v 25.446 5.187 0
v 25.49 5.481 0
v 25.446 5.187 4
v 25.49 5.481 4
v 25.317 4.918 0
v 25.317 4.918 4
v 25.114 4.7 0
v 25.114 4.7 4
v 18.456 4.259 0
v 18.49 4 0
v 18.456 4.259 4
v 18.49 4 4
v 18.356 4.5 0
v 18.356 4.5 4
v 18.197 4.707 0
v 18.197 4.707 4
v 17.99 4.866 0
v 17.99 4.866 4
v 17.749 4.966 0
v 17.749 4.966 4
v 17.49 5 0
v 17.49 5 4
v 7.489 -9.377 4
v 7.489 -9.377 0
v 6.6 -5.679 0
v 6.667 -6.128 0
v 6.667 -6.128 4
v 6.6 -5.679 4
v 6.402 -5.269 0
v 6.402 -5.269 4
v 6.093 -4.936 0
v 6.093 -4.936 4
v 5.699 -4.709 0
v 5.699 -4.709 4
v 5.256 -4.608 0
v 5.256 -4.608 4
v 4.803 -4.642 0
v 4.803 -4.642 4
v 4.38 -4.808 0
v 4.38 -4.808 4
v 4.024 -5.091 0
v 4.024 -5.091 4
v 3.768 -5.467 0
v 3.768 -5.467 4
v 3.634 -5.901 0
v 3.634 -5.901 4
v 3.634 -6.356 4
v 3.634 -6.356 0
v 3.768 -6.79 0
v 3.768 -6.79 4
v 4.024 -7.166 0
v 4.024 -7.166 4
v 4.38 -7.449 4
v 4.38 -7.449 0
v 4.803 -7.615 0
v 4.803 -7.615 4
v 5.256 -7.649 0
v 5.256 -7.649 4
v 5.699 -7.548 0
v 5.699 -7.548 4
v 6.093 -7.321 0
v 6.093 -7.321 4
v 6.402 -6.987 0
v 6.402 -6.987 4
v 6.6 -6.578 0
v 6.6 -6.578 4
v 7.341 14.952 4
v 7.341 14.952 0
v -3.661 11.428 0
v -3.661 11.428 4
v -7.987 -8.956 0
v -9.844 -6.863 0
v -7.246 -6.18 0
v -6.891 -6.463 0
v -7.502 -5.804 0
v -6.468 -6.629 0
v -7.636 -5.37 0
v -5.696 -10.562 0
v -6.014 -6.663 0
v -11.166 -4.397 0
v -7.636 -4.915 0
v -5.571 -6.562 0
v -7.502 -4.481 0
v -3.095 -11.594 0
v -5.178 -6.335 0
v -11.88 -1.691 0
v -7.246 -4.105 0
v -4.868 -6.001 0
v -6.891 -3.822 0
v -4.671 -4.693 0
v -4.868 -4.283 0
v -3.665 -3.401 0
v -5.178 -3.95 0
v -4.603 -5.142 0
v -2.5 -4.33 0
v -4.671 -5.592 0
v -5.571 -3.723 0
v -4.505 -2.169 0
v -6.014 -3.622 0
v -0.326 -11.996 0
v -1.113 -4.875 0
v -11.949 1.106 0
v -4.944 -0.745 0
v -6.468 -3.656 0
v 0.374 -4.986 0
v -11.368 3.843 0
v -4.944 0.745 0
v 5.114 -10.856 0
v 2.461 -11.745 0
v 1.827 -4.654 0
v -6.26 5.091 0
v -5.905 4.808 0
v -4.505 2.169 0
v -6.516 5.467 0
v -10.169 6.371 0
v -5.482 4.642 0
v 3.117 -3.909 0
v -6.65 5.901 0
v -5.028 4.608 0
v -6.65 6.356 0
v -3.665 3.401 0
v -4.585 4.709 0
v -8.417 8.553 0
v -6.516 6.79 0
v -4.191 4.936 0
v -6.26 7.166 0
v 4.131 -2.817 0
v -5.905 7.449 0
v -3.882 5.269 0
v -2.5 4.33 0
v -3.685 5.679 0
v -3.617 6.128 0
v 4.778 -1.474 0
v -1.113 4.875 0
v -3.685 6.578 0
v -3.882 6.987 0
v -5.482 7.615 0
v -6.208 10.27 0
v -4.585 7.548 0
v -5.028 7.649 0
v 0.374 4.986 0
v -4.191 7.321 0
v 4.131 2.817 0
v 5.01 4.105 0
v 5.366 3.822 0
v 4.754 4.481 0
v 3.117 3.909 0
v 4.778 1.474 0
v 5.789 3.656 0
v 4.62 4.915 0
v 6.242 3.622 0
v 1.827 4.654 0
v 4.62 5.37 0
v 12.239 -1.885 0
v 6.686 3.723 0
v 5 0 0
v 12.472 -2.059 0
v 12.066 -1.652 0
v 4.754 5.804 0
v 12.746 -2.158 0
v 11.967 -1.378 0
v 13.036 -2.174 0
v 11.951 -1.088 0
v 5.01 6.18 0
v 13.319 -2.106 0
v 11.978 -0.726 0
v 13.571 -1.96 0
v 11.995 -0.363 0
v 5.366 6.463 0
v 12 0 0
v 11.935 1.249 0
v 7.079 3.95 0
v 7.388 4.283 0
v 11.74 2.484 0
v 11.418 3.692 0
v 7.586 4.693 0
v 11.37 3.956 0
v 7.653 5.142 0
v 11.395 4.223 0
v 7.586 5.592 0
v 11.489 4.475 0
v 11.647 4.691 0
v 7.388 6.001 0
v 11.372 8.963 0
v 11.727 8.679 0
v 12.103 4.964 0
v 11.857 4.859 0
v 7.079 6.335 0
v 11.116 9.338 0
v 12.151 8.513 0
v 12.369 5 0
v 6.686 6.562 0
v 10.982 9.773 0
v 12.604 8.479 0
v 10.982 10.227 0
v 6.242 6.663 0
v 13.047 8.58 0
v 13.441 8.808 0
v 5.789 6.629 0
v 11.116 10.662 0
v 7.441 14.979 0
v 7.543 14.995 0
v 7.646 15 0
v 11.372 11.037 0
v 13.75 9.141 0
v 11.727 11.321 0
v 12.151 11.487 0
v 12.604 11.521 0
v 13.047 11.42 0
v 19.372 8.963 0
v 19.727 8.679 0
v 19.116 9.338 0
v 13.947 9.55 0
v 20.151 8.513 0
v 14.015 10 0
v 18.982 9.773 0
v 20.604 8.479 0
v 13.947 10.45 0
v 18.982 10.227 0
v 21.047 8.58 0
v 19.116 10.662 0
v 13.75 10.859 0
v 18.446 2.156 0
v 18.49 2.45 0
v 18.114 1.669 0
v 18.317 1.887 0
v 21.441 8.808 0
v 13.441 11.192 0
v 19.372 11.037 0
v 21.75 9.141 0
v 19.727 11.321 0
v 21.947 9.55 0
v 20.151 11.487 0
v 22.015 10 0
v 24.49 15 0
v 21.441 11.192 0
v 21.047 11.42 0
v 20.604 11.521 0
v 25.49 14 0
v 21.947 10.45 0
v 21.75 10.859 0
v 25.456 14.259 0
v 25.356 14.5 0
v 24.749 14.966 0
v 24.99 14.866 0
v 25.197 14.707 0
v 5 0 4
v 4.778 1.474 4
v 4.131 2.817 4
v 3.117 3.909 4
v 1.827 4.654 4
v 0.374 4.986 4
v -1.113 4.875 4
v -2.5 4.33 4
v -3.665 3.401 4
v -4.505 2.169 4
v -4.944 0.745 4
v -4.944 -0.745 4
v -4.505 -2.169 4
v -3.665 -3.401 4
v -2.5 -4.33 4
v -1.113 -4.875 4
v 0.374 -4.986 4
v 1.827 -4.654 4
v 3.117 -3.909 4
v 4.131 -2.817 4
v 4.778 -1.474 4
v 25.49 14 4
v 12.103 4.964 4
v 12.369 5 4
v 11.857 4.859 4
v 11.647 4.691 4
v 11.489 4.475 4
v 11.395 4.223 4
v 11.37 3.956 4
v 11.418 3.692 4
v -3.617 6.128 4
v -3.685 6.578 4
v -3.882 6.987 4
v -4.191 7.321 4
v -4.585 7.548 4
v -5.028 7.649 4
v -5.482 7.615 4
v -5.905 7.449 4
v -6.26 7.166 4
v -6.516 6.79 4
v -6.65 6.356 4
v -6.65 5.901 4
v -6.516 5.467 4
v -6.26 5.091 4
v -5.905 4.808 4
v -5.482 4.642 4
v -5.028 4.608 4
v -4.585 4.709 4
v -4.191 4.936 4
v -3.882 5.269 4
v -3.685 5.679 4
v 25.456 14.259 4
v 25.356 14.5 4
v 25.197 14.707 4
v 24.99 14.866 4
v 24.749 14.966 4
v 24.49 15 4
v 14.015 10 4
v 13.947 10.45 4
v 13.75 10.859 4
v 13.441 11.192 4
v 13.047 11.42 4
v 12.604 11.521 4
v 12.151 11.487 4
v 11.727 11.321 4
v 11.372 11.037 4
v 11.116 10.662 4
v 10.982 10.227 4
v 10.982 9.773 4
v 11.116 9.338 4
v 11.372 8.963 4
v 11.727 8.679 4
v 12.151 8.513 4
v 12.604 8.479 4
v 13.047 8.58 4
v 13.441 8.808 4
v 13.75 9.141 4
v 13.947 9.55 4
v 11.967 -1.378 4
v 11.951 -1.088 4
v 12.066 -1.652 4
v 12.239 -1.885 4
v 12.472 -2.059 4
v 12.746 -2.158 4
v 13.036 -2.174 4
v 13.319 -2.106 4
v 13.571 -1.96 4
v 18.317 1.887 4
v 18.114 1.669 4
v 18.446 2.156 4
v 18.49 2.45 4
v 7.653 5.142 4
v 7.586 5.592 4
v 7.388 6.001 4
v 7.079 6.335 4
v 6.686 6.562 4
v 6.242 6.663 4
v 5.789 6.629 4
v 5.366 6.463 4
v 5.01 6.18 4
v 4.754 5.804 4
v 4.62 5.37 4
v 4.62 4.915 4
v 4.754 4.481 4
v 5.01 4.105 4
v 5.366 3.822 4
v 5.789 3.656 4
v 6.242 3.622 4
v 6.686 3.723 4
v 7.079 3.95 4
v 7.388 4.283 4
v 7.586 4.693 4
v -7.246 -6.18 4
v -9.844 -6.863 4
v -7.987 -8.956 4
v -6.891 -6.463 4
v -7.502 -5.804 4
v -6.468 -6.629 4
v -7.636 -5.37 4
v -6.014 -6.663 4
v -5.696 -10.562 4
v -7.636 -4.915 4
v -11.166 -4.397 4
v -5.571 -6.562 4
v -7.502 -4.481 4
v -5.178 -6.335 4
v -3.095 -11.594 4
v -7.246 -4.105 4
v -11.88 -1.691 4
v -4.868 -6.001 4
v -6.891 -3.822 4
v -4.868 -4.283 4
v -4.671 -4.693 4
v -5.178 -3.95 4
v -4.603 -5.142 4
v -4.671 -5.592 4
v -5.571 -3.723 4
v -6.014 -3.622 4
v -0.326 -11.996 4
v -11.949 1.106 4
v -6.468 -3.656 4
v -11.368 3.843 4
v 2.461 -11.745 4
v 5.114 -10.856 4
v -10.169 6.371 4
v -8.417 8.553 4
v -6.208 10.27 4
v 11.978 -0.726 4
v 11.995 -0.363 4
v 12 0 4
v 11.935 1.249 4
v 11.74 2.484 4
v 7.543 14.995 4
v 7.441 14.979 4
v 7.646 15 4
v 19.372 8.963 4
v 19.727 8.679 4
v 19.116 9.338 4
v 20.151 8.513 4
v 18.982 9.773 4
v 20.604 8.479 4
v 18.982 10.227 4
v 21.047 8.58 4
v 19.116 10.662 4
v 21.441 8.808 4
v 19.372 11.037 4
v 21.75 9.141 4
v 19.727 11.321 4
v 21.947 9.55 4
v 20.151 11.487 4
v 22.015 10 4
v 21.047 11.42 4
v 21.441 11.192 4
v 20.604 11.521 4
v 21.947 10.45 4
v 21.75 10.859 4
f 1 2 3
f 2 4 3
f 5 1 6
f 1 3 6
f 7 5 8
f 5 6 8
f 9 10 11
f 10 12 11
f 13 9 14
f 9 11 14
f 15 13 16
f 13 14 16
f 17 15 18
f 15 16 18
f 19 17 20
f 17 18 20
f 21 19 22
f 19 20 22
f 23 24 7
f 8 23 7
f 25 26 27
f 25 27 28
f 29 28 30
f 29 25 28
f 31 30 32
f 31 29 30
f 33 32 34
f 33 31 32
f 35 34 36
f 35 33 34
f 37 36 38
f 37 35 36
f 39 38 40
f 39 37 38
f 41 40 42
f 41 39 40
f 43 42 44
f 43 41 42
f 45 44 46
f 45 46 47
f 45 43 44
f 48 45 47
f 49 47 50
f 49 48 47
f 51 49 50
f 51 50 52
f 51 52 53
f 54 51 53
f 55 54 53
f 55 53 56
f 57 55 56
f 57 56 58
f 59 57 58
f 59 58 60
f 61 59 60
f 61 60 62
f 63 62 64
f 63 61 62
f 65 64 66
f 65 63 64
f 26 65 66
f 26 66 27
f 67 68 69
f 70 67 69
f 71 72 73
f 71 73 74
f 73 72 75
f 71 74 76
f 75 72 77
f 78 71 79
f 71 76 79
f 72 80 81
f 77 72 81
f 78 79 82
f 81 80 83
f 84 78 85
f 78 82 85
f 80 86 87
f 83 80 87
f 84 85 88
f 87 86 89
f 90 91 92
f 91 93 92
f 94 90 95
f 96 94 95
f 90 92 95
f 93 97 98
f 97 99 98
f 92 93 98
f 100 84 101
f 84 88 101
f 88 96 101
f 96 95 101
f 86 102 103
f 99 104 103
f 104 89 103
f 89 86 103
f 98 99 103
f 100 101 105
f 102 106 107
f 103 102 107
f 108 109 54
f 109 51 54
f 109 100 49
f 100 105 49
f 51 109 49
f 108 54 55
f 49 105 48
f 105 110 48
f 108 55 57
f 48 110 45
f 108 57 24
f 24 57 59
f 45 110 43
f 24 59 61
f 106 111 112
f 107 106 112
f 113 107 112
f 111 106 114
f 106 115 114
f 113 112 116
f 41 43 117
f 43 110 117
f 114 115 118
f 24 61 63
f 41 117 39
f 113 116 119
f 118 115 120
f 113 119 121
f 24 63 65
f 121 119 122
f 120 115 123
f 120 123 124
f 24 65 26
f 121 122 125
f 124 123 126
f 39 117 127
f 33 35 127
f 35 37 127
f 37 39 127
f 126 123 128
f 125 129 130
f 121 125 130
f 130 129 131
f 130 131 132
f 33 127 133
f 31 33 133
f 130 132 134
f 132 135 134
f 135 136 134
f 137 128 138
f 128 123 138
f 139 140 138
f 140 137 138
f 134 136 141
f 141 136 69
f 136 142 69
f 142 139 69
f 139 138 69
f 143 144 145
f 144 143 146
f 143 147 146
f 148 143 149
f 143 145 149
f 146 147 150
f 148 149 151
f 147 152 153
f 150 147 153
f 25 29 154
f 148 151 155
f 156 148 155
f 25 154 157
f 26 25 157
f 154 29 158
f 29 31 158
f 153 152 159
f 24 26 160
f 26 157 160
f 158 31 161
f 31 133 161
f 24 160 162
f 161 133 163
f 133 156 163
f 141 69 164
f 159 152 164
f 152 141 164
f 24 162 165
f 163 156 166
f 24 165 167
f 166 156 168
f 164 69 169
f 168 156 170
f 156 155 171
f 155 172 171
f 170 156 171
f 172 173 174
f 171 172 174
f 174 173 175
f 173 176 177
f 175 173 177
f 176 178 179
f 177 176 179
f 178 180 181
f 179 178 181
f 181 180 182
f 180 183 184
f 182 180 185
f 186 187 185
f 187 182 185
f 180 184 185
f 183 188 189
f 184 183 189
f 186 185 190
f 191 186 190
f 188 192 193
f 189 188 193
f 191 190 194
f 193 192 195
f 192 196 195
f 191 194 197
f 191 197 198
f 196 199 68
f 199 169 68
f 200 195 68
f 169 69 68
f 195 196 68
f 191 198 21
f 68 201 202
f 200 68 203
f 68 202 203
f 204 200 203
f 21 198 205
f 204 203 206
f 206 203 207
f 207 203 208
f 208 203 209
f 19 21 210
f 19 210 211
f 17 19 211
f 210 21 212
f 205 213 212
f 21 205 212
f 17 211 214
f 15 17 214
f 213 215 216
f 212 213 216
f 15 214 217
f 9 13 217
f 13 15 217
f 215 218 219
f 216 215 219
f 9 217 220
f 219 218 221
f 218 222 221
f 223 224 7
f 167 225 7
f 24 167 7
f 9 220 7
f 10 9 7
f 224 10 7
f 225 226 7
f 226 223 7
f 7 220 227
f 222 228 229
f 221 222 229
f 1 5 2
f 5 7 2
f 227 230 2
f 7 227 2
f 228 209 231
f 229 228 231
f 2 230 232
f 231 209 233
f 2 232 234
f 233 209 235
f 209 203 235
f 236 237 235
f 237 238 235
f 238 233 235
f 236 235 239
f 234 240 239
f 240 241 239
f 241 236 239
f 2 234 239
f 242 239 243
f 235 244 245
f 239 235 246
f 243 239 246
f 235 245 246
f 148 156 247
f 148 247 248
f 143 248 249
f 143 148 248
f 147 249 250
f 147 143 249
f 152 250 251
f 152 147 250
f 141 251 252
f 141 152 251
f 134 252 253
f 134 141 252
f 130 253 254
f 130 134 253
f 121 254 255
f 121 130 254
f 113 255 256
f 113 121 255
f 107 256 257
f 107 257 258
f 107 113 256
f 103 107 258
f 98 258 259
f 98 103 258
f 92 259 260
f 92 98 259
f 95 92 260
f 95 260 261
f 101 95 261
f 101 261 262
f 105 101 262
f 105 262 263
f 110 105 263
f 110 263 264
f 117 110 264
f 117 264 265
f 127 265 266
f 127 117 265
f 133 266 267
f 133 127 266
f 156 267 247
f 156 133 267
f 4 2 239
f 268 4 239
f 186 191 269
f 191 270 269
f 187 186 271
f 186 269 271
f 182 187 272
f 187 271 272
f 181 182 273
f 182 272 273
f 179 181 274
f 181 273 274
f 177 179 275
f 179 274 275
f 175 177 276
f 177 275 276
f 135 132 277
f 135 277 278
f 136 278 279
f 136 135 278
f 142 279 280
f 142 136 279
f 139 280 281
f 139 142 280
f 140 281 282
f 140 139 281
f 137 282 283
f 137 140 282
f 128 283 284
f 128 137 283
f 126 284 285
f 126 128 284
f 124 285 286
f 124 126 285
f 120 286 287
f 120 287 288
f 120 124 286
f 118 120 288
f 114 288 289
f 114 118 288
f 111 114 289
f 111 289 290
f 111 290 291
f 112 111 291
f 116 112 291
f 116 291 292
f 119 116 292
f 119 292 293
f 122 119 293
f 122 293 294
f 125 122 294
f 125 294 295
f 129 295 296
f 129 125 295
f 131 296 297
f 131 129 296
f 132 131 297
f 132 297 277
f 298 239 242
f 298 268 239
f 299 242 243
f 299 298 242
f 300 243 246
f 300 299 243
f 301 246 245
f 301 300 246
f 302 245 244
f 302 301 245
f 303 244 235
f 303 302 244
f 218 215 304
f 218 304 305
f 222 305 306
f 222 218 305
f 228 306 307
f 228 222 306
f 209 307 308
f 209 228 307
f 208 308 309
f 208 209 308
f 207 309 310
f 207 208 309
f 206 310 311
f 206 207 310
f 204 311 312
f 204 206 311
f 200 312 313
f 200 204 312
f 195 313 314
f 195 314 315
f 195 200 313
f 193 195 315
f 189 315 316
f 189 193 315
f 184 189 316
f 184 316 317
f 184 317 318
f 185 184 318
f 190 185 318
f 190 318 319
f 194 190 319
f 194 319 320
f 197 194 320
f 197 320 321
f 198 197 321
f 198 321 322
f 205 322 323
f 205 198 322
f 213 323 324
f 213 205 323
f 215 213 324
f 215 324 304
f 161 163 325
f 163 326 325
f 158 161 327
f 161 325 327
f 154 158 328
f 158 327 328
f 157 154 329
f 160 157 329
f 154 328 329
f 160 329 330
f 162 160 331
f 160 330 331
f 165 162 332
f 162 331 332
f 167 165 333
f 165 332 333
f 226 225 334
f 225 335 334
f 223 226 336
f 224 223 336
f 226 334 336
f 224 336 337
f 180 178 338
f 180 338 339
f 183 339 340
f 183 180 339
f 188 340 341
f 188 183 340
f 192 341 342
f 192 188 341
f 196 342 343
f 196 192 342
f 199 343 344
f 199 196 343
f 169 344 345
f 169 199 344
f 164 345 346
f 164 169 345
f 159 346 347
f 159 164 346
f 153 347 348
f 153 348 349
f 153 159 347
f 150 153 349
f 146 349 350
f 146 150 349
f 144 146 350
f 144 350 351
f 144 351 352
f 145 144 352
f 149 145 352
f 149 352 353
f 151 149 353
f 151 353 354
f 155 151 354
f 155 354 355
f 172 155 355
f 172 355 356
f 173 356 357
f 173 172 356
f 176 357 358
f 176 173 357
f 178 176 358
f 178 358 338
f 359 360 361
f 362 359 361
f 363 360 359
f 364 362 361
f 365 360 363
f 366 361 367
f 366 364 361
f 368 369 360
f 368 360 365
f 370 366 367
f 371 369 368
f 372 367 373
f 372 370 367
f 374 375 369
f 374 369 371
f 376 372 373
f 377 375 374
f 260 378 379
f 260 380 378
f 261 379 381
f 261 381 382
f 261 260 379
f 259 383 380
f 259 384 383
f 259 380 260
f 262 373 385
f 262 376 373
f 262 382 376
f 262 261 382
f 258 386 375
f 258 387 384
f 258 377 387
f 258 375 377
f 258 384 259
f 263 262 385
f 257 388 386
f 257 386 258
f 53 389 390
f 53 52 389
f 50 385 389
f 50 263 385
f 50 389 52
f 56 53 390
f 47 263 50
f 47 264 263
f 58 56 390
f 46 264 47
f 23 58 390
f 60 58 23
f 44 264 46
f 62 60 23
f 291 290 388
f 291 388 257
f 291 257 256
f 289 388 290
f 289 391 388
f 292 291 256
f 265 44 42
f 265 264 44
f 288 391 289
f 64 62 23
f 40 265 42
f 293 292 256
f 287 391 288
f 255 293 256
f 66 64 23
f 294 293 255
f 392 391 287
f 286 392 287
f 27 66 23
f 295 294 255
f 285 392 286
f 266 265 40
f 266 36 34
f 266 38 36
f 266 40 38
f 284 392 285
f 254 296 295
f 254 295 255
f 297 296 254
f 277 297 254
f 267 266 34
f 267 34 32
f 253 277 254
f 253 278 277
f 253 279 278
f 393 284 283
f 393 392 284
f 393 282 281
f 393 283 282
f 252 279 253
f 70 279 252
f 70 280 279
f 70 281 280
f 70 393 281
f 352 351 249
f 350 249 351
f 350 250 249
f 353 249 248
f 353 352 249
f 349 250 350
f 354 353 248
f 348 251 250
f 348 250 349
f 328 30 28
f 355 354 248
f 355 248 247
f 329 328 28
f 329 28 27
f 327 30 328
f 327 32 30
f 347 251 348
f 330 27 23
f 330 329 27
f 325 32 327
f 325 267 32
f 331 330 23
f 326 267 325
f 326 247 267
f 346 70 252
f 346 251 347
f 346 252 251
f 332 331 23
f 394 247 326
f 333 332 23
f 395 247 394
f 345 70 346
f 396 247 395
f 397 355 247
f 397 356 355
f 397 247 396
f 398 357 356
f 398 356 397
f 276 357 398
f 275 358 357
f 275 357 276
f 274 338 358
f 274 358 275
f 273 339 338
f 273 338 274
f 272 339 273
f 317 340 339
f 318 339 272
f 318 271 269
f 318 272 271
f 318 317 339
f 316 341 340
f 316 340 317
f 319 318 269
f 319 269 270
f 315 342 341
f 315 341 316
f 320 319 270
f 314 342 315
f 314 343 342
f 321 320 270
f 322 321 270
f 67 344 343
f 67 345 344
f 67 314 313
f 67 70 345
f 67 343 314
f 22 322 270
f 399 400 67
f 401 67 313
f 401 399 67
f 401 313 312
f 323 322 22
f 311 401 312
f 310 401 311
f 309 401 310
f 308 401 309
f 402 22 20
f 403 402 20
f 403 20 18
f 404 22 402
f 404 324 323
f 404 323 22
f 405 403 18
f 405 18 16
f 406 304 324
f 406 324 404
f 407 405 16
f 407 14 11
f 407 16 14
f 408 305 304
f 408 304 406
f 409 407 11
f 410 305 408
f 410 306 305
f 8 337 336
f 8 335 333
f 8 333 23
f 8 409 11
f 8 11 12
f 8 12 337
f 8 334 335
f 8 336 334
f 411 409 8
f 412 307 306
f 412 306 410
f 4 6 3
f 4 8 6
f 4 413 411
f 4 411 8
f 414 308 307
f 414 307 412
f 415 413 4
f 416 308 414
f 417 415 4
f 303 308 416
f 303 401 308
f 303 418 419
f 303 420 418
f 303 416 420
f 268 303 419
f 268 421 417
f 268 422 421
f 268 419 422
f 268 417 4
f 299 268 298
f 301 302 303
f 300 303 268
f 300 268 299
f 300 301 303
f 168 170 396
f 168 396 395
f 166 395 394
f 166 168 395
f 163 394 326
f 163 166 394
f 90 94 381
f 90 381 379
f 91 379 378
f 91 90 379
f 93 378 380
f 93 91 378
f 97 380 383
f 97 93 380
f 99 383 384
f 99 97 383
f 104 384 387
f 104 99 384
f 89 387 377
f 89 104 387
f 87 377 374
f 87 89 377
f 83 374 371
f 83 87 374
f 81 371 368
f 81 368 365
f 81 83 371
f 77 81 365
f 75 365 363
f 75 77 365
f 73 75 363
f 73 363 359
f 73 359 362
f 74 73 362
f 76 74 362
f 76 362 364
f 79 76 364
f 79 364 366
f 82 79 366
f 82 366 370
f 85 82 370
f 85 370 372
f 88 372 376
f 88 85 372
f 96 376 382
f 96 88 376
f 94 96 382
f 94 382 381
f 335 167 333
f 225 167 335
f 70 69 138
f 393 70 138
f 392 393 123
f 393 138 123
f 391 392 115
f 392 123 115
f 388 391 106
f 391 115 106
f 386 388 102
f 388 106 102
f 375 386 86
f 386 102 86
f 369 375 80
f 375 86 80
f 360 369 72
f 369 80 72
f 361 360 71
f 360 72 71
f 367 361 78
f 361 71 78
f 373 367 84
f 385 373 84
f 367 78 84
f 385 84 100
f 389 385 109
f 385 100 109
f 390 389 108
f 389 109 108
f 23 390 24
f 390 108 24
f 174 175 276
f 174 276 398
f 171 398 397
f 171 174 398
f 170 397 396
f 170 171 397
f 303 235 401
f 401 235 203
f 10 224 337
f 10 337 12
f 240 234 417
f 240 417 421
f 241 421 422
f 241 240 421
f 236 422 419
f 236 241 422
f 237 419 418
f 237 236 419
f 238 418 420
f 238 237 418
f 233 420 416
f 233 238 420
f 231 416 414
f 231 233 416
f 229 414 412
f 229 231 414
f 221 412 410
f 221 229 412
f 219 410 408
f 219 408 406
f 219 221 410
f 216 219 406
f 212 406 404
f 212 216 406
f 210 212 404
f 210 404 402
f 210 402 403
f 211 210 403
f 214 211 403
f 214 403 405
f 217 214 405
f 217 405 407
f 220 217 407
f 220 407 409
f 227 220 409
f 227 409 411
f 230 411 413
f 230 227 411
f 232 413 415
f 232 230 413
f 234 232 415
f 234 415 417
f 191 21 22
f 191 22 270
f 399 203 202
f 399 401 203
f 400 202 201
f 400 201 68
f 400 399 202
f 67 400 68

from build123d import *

# Parameters (mm, degrees)
SKETCH_1_R          = 1.525
SKETCH_1_R_2        = 5
EXTRUDE_1_DEPTH     = 4
CUT_EXTRUDE_START   = -4
CUT_EXTRUDE_1_DEPTH = 4
FILLET_1_R          = 1


with BuildPart() as part:
    # 草图1 → 凸台-拉伸1 (new body)
    # profile 1 of 2: a face of its own
    with BuildSketch(Plane.XY):
        with BuildLine():
            ThreePointArc((12, 0), (7.073549415, 9.693549333), (-3.660816447, 11.427966702))
            ThreePointArc((-3.660816447, 11.427966702), (-10.576904144, -5.668253587), (7.48855525, -9.376648669))
            ThreePointArc((7.48855525, -9.376648669), (10.813479158, -5.202755856), (12, 0))
        make_face()
        with Locations((5.142300877, -6.128355545)):
            Circle(SKETCH_1_R, mode=Mode.SUBTRACT)
        with Locations((-6.128355545, -5.142300877)):
            Circle(SKETCH_1_R, mode=Mode.SUBTRACT)
        Circle(SKETCH_1_R_2, mode=Mode.SUBTRACT)
        with Locations((-5.142300877, 6.128355545)):
            Circle(SKETCH_1_R, mode=Mode.SUBTRACT)
        with Locations((6.128355545, 5.142300877)):
            Circle(SKETCH_1_R, mode=Mode.SUBTRACT)
    # profile 2 of 2: a face of its own
    with BuildSketch(Plane.XY):
        with BuildLine():
            Line((25.489995997, 5), (25.489995997, 15))
            Line((25.489995997, 15), (7.489995997, 15))
            Line((7.489995997, 15), (-3.660816447, 11.427966702))
            ThreePointArc((-3.660816447, 11.427966702), (7.073549415, 9.693549333), (12, 0))
            ThreePointArc((12, 0), (10.813479158, -5.202755856), (7.48855525, -9.376648669))
            Line((7.48855525, -9.376648669), (25.489995997, 5))
        make_face()
        with Locations((12.489995997, 10)):
            Circle(SKETCH_1_R, mode=Mode.SUBTRACT)
        with Locations((20.489995997, 10)):
            Circle(SKETCH_1_R, mode=Mode.SUBTRACT)
    extrude(amount=EXTRUDE_1_DEPTH)

    # 草图2 → 切除-拉伸1 (cut)
    with BuildSketch(Plane.XY.offset(4).offset(CUT_EXTRUDE_START)):
        with BuildLine():
            ThreePointArc((12, 0), (11.855024322, -1.85967694), (11.42360028, -3.674419227))
            Line((11.42360028, -3.674419227), (18.489995997, 1.969078425))
            Line((18.489995997, 1.969078425), (18.489995997, 5))
            Line((18.489995997, 5), (10.908712115, 5))
            ThreePointArc((10.908712115, 5), (11.724004123, 2.558852734), (12, 0))
        make_face()
    extrude(amount=CUT_EXTRUDE_1_DEPTH, mode=Mode.SUBTRACT)

    # 圆角1
    fillet_1_edges = [part.edges().sort_by_distance(p)[0] for p in [
        (7.489995997, 15, 2),
        (25.489995997, 15, 2),
        (25.489995997, 5, 2),
        (11.42360028, -3.674419227, 2),
        (10.908712115, 5, 2),
        (18.489995997, 5, 2),
        (18.489995997, 1.969078425, 2),
    ]]
    fillet(fillet_1_edges, radius=FILLET_1_R)


solid = part.part
